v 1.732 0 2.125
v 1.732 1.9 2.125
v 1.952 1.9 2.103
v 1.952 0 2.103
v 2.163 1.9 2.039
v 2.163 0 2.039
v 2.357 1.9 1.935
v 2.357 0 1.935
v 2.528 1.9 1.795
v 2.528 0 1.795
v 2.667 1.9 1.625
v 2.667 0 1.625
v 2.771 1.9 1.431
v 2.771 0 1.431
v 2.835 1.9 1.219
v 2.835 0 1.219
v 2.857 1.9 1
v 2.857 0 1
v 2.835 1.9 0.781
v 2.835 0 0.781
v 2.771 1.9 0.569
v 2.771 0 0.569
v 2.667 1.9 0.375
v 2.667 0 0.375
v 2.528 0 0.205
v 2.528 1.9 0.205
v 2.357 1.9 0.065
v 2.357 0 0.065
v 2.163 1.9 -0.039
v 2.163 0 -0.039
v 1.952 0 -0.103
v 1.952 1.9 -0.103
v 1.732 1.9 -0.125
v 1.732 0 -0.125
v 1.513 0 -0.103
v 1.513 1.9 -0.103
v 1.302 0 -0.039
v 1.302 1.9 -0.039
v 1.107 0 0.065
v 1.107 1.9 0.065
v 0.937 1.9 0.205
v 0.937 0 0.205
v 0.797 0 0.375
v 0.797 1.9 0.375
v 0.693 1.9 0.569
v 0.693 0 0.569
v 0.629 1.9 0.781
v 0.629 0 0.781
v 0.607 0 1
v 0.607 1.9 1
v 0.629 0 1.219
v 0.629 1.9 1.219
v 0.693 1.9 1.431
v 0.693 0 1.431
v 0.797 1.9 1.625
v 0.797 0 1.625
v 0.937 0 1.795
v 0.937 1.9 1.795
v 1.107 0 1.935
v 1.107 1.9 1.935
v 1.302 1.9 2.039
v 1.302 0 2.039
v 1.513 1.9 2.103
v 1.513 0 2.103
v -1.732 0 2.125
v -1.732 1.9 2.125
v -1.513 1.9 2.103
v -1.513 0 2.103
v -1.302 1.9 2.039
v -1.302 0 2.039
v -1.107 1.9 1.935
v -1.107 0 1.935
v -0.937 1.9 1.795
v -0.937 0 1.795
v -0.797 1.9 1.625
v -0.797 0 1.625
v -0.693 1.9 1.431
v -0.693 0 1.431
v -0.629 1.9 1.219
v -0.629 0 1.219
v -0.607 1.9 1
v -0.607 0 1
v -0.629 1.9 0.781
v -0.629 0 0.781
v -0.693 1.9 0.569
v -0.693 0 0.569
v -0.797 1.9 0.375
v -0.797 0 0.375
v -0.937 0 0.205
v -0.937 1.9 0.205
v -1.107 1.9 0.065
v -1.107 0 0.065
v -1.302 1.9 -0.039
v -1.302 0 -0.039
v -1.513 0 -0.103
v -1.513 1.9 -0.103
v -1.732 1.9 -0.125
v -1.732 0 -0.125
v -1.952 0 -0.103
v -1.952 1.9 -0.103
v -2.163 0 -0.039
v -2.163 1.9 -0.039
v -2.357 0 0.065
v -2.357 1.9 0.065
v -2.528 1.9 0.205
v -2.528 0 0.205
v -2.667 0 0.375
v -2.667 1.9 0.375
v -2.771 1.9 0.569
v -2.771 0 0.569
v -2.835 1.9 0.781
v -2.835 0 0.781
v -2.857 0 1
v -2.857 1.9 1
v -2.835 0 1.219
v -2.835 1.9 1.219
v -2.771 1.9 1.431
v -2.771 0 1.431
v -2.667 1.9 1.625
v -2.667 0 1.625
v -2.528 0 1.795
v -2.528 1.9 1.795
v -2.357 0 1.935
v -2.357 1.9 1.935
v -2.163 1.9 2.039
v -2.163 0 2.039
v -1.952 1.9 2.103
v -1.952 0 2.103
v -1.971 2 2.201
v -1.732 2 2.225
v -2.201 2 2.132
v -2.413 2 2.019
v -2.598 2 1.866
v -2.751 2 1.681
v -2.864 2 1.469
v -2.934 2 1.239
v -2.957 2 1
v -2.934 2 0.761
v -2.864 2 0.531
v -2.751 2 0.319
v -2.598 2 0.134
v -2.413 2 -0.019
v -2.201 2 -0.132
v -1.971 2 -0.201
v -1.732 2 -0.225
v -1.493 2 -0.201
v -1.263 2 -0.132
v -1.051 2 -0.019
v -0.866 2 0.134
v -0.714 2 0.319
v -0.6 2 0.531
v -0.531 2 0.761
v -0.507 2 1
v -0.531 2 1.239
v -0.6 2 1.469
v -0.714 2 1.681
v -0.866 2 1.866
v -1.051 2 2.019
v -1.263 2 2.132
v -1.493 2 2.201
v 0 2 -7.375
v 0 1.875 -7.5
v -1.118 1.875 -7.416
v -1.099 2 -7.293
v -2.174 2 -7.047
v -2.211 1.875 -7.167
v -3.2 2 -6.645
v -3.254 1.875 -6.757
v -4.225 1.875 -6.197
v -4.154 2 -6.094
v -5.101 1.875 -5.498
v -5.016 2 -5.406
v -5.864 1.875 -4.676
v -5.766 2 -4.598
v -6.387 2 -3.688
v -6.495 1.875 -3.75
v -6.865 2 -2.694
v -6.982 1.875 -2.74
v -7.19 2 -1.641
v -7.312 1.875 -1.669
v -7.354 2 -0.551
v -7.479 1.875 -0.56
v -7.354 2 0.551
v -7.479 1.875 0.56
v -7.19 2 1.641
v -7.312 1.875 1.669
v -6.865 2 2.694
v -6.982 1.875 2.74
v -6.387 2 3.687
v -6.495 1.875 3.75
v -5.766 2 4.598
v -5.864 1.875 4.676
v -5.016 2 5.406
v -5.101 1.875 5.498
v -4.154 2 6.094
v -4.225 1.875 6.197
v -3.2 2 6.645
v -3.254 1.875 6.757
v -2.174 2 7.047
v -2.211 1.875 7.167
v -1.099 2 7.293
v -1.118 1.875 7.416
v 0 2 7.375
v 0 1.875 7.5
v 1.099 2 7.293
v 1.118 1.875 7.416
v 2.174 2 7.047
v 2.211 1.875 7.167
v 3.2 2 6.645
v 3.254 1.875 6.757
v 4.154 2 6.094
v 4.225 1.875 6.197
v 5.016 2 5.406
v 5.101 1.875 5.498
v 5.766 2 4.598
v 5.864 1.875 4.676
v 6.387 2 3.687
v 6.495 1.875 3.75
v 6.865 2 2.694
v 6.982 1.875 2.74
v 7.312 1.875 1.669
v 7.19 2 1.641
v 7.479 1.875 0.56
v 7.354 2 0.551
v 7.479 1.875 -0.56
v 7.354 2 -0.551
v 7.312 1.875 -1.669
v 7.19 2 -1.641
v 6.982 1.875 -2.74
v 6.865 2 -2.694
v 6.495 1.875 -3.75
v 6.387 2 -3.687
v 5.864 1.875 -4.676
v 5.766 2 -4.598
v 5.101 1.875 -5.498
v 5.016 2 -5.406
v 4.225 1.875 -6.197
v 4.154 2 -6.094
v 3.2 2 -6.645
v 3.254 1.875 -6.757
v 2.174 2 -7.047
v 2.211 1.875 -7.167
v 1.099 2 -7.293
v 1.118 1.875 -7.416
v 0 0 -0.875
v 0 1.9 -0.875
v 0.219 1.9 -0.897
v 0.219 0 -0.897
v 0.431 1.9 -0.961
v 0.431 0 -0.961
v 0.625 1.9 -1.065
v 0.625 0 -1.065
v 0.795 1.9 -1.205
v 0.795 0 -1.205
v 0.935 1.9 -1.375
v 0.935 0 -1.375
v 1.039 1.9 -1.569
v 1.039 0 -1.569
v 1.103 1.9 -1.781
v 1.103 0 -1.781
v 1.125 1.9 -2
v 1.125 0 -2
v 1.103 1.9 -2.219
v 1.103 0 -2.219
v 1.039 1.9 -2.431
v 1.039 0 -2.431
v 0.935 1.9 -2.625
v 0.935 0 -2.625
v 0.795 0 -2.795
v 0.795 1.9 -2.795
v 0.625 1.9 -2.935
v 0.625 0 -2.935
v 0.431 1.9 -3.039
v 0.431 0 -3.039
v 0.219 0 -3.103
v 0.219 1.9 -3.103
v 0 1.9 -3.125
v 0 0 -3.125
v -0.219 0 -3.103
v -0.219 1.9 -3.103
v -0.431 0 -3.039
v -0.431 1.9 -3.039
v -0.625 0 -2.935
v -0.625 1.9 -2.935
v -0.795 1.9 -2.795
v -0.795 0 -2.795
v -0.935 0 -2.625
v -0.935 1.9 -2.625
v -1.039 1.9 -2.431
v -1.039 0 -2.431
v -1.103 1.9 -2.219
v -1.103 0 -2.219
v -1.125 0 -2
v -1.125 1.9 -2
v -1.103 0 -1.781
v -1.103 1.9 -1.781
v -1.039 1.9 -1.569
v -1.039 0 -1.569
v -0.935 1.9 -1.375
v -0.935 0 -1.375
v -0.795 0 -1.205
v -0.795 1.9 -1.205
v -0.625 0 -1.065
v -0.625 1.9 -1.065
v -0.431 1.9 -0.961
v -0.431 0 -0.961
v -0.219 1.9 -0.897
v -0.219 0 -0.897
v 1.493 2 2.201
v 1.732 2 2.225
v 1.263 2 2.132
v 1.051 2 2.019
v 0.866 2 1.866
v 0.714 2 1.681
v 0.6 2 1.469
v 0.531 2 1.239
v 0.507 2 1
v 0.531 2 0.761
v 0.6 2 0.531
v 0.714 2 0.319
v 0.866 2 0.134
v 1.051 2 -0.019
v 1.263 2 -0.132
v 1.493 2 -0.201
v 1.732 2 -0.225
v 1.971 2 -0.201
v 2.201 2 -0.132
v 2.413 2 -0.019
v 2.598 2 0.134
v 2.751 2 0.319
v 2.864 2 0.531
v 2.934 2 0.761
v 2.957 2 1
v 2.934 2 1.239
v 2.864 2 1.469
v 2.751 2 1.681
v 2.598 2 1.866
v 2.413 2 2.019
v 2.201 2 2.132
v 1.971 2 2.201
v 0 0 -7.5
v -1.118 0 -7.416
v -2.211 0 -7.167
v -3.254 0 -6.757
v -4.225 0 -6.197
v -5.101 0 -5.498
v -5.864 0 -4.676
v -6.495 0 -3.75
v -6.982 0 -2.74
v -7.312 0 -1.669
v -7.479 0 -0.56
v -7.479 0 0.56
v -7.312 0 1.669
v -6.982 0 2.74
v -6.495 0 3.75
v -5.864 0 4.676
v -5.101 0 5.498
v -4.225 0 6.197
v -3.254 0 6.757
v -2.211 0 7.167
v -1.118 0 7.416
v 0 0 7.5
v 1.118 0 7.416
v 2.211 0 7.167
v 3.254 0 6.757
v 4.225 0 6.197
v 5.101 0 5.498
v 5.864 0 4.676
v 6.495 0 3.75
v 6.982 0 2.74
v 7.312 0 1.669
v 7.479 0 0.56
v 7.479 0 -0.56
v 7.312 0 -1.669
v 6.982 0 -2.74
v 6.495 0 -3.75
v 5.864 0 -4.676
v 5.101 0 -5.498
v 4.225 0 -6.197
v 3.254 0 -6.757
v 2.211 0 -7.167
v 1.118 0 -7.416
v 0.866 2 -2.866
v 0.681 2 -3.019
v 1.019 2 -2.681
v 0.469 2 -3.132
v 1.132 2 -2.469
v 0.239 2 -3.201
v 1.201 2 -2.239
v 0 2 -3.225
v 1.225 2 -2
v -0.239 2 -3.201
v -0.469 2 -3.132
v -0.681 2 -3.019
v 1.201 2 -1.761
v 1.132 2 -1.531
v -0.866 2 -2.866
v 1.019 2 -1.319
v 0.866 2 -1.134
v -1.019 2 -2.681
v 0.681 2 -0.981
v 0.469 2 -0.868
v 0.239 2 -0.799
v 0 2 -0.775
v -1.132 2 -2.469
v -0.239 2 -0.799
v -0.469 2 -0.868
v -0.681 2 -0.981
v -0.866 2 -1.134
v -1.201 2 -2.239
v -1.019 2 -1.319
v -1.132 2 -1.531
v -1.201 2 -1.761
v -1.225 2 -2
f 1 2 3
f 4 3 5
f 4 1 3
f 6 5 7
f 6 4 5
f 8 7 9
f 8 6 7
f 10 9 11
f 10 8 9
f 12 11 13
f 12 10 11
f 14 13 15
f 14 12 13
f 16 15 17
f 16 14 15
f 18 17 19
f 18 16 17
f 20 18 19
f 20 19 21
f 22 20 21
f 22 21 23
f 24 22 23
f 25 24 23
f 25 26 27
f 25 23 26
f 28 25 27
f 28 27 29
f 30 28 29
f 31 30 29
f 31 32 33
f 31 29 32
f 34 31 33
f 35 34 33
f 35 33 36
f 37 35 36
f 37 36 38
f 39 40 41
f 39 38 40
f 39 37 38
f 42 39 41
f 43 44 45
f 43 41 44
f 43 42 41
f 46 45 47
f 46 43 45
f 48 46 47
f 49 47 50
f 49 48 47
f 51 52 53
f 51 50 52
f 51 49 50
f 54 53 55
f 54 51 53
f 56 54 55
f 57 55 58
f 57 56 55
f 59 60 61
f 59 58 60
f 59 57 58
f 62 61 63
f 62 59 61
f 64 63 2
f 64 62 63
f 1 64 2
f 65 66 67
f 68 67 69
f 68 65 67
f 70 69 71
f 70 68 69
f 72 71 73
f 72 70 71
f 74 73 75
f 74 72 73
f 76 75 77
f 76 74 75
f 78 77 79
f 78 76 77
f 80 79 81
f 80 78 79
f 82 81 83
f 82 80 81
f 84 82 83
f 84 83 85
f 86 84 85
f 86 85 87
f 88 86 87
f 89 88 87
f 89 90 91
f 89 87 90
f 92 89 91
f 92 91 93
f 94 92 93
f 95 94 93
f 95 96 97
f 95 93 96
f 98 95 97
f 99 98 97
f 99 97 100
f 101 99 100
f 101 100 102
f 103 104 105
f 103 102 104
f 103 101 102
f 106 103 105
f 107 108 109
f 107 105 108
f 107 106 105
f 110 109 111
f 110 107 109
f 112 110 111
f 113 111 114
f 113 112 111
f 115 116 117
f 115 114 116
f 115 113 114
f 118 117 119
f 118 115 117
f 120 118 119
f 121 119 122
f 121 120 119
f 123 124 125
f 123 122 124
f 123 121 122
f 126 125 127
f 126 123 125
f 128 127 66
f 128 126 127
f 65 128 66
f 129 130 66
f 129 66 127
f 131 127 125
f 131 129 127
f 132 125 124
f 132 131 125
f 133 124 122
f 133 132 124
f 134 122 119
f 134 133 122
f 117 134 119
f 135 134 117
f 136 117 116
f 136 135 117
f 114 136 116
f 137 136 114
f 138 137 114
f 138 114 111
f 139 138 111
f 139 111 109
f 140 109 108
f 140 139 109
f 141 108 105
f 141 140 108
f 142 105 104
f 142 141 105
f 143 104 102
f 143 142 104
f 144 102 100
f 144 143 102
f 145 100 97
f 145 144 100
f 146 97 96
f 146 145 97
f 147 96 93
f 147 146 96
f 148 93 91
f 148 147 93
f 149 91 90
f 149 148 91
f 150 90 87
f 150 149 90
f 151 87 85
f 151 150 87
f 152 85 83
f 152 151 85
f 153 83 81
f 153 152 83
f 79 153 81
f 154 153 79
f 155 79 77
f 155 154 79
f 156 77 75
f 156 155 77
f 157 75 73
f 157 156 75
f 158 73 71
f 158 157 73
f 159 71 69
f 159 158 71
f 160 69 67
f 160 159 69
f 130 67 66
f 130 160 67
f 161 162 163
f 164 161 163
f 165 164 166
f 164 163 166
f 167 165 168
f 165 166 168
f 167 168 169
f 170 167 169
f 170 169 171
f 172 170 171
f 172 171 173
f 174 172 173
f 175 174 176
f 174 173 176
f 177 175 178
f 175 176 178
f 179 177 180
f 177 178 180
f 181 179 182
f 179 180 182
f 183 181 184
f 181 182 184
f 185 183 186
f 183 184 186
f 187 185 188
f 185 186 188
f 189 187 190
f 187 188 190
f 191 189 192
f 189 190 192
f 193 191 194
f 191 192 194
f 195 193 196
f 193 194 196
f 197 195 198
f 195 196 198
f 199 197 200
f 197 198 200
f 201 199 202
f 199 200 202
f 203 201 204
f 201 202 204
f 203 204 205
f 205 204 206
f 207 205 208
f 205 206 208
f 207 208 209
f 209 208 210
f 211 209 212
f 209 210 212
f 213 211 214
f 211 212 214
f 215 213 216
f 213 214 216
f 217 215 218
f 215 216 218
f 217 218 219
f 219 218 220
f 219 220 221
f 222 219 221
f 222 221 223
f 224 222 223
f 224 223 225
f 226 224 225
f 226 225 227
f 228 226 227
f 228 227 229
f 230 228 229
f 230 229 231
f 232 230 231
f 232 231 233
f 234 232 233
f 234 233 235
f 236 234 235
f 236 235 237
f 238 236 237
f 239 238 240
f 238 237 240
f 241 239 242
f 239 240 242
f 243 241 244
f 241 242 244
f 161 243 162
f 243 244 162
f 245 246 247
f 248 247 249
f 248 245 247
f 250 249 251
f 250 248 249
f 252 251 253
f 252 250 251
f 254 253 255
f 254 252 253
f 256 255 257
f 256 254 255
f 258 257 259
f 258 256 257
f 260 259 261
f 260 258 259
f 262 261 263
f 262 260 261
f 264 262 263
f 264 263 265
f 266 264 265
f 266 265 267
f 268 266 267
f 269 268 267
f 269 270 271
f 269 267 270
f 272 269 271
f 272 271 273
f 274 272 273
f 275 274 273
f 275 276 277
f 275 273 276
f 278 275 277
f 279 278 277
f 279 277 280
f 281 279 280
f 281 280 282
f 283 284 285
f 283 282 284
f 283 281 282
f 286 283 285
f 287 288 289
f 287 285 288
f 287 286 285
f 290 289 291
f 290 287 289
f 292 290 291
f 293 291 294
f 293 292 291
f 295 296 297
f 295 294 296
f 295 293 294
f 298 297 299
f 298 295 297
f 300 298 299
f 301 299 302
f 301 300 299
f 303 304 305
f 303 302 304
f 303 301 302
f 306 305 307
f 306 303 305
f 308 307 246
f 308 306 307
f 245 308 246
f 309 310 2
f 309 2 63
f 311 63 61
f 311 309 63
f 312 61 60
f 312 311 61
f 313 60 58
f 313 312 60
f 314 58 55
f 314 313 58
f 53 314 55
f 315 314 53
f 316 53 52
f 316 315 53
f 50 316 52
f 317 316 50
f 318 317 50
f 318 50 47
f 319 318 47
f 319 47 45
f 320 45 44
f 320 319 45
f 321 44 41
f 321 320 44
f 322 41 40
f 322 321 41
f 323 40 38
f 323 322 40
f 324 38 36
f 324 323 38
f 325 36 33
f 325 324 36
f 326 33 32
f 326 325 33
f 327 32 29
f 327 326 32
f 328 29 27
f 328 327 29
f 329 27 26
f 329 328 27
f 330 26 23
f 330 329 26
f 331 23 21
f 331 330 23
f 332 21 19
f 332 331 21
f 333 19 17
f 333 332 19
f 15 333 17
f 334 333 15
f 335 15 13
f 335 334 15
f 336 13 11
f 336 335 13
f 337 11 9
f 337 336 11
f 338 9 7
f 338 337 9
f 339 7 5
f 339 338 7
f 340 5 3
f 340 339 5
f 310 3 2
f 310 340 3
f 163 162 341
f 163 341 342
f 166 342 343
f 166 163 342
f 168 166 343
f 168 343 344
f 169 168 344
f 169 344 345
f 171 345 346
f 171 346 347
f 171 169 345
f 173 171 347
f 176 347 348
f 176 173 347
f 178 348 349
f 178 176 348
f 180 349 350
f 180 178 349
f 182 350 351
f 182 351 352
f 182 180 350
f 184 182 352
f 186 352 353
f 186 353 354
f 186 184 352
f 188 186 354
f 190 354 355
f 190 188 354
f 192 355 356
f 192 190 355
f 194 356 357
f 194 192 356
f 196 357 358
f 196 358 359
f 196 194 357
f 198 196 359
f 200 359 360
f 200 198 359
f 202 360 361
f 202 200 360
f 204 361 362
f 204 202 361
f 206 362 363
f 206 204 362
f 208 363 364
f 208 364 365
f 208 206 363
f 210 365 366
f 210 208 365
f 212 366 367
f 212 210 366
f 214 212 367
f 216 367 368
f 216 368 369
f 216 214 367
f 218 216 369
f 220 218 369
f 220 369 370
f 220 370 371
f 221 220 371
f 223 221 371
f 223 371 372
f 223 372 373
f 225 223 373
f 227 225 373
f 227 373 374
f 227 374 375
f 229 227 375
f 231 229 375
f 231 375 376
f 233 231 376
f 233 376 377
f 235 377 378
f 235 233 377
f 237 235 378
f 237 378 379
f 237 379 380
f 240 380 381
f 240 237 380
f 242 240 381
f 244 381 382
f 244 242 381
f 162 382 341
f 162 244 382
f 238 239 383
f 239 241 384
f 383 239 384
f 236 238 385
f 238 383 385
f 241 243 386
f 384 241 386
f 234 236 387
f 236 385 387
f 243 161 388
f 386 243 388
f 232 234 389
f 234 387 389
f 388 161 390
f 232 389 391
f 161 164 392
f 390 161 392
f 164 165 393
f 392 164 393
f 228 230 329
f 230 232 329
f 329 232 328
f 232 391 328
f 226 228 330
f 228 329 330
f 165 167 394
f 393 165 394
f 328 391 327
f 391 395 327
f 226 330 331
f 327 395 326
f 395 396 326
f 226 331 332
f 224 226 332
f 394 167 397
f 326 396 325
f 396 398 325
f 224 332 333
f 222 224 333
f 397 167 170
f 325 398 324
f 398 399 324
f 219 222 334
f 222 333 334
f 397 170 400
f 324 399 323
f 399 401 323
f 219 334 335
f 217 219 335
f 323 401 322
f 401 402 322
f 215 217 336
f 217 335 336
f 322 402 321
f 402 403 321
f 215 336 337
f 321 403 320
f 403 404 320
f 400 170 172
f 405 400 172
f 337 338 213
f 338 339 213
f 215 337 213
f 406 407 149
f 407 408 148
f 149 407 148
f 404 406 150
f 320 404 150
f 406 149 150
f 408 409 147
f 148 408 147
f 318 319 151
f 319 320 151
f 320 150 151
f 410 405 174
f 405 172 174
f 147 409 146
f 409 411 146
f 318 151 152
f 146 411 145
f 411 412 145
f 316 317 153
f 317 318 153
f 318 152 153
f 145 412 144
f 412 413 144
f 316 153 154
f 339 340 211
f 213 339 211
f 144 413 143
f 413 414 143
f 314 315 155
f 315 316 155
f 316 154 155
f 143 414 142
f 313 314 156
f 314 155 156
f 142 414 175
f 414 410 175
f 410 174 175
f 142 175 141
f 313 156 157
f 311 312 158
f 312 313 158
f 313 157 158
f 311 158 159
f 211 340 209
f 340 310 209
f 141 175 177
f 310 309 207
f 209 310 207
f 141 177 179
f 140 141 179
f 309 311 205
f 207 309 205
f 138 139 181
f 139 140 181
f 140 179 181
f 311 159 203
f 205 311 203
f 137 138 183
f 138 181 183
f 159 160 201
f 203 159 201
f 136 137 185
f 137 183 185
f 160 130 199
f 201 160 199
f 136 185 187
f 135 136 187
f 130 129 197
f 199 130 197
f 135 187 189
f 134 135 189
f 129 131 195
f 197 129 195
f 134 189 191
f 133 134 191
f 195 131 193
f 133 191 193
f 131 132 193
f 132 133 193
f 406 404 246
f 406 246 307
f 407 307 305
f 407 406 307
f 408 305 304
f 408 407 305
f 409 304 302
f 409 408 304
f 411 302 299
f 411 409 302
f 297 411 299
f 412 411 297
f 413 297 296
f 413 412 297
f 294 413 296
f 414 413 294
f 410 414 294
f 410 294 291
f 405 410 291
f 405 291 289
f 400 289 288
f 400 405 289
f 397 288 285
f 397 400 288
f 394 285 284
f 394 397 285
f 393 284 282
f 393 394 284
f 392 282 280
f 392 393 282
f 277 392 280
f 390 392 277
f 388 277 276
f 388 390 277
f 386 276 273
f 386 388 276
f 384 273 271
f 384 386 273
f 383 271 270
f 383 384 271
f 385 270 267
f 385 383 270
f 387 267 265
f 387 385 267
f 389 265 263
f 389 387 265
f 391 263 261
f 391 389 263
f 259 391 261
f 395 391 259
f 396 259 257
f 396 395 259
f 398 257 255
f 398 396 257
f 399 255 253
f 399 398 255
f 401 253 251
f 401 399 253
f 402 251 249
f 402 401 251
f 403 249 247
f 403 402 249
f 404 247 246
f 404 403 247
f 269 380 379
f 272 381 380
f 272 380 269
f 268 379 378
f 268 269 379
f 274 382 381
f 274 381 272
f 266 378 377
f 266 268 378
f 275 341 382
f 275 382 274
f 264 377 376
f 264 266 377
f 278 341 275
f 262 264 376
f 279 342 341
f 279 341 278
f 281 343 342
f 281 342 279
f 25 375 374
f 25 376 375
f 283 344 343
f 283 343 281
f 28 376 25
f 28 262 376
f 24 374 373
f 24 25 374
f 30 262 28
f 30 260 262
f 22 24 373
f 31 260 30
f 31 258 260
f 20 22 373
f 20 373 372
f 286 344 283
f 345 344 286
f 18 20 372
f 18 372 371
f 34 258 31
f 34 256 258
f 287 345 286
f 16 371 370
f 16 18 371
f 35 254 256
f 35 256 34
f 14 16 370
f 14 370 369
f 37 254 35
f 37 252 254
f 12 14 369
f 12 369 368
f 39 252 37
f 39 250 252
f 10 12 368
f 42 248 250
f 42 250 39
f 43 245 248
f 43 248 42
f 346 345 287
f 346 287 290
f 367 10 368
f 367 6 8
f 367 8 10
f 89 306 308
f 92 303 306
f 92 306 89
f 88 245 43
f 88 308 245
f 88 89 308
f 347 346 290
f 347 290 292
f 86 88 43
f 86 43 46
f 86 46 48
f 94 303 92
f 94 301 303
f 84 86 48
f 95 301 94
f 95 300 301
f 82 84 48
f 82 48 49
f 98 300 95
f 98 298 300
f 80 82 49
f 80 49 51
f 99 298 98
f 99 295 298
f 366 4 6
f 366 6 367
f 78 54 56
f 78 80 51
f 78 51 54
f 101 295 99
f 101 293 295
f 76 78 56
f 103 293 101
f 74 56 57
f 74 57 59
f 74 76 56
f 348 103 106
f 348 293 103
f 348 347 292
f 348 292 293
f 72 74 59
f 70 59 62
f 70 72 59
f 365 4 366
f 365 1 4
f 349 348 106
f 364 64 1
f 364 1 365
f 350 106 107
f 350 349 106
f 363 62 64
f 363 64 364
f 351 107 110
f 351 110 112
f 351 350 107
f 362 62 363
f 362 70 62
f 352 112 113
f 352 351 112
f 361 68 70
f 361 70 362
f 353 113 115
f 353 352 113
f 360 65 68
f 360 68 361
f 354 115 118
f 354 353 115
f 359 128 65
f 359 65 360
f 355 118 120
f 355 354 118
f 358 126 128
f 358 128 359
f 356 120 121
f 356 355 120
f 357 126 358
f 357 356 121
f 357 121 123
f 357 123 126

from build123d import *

# Parameters (mm, degrees)
SKETCH1_W          = 7.5
SKETCH1_H          = 2
SKETCH2_R          = 1.125
CUT_EXTRUDE1_DEPTH = 11.793516572
CHAMFER2_SIZE      = 0.1
CHAMFER3_SIZE      = 0.125


with BuildPart() as part:
    # Sketch1 → Revolve1 (revolve)
    with BuildSketch(Plane.XY, mode=Mode.PRIVATE) as revolve1_sk:
        with Locations((3.75, 1)):
            Rectangle(SKETCH1_W, SKETCH1_H)
    revolve(revolve1_sk.sketch.rotate(Axis((0, 0, 0), (0, 1, 0)), 90), axis=Axis((0, 0, 0), (0, 1, 0)))

    # Sketch2 → Cut-Extrude1 (cut, through all)
    with BuildSketch(Plane(origin=(0, 0, 0), x_dir=(1, 0, 0), z_dir=(0, 1, 0))):
        with Locations(Location((-1.732050808, -1, 0), (0, 0, 270))):
            Circle(SKETCH2_R)
        with Locations(Location((1.732050808, -1, 0), (0, 0, 270))):
            Circle(SKETCH2_R)
        with Locations(Location((0, 2, 0), (0, 0, 270))):
            Circle(SKETCH2_R)
    extrude(amount=CUT_EXTRUDE1_DEPTH, mode=Mode.SUBTRACT)

    # Chamfer2
    chamfer2_edges = [part.edges().sort_by_distance(p)[0] for p in [
        (0, 2, -3.125),
        (-1.732050808, 2, -0.125),
        (1.732050808, 2, -0.125),
    ]]
    chamfer(chamfer2_edges, length=CHAMFER2_SIZE)

    # Chamfer3
    chamfer3_edges = [part.edges().sort_by_distance(p)[0] for p in [
        (0, 2, 7.5),
    ]]
    chamfer(chamfer3_edges, length=CHAMFER3_SIZE)


solid = part.part
